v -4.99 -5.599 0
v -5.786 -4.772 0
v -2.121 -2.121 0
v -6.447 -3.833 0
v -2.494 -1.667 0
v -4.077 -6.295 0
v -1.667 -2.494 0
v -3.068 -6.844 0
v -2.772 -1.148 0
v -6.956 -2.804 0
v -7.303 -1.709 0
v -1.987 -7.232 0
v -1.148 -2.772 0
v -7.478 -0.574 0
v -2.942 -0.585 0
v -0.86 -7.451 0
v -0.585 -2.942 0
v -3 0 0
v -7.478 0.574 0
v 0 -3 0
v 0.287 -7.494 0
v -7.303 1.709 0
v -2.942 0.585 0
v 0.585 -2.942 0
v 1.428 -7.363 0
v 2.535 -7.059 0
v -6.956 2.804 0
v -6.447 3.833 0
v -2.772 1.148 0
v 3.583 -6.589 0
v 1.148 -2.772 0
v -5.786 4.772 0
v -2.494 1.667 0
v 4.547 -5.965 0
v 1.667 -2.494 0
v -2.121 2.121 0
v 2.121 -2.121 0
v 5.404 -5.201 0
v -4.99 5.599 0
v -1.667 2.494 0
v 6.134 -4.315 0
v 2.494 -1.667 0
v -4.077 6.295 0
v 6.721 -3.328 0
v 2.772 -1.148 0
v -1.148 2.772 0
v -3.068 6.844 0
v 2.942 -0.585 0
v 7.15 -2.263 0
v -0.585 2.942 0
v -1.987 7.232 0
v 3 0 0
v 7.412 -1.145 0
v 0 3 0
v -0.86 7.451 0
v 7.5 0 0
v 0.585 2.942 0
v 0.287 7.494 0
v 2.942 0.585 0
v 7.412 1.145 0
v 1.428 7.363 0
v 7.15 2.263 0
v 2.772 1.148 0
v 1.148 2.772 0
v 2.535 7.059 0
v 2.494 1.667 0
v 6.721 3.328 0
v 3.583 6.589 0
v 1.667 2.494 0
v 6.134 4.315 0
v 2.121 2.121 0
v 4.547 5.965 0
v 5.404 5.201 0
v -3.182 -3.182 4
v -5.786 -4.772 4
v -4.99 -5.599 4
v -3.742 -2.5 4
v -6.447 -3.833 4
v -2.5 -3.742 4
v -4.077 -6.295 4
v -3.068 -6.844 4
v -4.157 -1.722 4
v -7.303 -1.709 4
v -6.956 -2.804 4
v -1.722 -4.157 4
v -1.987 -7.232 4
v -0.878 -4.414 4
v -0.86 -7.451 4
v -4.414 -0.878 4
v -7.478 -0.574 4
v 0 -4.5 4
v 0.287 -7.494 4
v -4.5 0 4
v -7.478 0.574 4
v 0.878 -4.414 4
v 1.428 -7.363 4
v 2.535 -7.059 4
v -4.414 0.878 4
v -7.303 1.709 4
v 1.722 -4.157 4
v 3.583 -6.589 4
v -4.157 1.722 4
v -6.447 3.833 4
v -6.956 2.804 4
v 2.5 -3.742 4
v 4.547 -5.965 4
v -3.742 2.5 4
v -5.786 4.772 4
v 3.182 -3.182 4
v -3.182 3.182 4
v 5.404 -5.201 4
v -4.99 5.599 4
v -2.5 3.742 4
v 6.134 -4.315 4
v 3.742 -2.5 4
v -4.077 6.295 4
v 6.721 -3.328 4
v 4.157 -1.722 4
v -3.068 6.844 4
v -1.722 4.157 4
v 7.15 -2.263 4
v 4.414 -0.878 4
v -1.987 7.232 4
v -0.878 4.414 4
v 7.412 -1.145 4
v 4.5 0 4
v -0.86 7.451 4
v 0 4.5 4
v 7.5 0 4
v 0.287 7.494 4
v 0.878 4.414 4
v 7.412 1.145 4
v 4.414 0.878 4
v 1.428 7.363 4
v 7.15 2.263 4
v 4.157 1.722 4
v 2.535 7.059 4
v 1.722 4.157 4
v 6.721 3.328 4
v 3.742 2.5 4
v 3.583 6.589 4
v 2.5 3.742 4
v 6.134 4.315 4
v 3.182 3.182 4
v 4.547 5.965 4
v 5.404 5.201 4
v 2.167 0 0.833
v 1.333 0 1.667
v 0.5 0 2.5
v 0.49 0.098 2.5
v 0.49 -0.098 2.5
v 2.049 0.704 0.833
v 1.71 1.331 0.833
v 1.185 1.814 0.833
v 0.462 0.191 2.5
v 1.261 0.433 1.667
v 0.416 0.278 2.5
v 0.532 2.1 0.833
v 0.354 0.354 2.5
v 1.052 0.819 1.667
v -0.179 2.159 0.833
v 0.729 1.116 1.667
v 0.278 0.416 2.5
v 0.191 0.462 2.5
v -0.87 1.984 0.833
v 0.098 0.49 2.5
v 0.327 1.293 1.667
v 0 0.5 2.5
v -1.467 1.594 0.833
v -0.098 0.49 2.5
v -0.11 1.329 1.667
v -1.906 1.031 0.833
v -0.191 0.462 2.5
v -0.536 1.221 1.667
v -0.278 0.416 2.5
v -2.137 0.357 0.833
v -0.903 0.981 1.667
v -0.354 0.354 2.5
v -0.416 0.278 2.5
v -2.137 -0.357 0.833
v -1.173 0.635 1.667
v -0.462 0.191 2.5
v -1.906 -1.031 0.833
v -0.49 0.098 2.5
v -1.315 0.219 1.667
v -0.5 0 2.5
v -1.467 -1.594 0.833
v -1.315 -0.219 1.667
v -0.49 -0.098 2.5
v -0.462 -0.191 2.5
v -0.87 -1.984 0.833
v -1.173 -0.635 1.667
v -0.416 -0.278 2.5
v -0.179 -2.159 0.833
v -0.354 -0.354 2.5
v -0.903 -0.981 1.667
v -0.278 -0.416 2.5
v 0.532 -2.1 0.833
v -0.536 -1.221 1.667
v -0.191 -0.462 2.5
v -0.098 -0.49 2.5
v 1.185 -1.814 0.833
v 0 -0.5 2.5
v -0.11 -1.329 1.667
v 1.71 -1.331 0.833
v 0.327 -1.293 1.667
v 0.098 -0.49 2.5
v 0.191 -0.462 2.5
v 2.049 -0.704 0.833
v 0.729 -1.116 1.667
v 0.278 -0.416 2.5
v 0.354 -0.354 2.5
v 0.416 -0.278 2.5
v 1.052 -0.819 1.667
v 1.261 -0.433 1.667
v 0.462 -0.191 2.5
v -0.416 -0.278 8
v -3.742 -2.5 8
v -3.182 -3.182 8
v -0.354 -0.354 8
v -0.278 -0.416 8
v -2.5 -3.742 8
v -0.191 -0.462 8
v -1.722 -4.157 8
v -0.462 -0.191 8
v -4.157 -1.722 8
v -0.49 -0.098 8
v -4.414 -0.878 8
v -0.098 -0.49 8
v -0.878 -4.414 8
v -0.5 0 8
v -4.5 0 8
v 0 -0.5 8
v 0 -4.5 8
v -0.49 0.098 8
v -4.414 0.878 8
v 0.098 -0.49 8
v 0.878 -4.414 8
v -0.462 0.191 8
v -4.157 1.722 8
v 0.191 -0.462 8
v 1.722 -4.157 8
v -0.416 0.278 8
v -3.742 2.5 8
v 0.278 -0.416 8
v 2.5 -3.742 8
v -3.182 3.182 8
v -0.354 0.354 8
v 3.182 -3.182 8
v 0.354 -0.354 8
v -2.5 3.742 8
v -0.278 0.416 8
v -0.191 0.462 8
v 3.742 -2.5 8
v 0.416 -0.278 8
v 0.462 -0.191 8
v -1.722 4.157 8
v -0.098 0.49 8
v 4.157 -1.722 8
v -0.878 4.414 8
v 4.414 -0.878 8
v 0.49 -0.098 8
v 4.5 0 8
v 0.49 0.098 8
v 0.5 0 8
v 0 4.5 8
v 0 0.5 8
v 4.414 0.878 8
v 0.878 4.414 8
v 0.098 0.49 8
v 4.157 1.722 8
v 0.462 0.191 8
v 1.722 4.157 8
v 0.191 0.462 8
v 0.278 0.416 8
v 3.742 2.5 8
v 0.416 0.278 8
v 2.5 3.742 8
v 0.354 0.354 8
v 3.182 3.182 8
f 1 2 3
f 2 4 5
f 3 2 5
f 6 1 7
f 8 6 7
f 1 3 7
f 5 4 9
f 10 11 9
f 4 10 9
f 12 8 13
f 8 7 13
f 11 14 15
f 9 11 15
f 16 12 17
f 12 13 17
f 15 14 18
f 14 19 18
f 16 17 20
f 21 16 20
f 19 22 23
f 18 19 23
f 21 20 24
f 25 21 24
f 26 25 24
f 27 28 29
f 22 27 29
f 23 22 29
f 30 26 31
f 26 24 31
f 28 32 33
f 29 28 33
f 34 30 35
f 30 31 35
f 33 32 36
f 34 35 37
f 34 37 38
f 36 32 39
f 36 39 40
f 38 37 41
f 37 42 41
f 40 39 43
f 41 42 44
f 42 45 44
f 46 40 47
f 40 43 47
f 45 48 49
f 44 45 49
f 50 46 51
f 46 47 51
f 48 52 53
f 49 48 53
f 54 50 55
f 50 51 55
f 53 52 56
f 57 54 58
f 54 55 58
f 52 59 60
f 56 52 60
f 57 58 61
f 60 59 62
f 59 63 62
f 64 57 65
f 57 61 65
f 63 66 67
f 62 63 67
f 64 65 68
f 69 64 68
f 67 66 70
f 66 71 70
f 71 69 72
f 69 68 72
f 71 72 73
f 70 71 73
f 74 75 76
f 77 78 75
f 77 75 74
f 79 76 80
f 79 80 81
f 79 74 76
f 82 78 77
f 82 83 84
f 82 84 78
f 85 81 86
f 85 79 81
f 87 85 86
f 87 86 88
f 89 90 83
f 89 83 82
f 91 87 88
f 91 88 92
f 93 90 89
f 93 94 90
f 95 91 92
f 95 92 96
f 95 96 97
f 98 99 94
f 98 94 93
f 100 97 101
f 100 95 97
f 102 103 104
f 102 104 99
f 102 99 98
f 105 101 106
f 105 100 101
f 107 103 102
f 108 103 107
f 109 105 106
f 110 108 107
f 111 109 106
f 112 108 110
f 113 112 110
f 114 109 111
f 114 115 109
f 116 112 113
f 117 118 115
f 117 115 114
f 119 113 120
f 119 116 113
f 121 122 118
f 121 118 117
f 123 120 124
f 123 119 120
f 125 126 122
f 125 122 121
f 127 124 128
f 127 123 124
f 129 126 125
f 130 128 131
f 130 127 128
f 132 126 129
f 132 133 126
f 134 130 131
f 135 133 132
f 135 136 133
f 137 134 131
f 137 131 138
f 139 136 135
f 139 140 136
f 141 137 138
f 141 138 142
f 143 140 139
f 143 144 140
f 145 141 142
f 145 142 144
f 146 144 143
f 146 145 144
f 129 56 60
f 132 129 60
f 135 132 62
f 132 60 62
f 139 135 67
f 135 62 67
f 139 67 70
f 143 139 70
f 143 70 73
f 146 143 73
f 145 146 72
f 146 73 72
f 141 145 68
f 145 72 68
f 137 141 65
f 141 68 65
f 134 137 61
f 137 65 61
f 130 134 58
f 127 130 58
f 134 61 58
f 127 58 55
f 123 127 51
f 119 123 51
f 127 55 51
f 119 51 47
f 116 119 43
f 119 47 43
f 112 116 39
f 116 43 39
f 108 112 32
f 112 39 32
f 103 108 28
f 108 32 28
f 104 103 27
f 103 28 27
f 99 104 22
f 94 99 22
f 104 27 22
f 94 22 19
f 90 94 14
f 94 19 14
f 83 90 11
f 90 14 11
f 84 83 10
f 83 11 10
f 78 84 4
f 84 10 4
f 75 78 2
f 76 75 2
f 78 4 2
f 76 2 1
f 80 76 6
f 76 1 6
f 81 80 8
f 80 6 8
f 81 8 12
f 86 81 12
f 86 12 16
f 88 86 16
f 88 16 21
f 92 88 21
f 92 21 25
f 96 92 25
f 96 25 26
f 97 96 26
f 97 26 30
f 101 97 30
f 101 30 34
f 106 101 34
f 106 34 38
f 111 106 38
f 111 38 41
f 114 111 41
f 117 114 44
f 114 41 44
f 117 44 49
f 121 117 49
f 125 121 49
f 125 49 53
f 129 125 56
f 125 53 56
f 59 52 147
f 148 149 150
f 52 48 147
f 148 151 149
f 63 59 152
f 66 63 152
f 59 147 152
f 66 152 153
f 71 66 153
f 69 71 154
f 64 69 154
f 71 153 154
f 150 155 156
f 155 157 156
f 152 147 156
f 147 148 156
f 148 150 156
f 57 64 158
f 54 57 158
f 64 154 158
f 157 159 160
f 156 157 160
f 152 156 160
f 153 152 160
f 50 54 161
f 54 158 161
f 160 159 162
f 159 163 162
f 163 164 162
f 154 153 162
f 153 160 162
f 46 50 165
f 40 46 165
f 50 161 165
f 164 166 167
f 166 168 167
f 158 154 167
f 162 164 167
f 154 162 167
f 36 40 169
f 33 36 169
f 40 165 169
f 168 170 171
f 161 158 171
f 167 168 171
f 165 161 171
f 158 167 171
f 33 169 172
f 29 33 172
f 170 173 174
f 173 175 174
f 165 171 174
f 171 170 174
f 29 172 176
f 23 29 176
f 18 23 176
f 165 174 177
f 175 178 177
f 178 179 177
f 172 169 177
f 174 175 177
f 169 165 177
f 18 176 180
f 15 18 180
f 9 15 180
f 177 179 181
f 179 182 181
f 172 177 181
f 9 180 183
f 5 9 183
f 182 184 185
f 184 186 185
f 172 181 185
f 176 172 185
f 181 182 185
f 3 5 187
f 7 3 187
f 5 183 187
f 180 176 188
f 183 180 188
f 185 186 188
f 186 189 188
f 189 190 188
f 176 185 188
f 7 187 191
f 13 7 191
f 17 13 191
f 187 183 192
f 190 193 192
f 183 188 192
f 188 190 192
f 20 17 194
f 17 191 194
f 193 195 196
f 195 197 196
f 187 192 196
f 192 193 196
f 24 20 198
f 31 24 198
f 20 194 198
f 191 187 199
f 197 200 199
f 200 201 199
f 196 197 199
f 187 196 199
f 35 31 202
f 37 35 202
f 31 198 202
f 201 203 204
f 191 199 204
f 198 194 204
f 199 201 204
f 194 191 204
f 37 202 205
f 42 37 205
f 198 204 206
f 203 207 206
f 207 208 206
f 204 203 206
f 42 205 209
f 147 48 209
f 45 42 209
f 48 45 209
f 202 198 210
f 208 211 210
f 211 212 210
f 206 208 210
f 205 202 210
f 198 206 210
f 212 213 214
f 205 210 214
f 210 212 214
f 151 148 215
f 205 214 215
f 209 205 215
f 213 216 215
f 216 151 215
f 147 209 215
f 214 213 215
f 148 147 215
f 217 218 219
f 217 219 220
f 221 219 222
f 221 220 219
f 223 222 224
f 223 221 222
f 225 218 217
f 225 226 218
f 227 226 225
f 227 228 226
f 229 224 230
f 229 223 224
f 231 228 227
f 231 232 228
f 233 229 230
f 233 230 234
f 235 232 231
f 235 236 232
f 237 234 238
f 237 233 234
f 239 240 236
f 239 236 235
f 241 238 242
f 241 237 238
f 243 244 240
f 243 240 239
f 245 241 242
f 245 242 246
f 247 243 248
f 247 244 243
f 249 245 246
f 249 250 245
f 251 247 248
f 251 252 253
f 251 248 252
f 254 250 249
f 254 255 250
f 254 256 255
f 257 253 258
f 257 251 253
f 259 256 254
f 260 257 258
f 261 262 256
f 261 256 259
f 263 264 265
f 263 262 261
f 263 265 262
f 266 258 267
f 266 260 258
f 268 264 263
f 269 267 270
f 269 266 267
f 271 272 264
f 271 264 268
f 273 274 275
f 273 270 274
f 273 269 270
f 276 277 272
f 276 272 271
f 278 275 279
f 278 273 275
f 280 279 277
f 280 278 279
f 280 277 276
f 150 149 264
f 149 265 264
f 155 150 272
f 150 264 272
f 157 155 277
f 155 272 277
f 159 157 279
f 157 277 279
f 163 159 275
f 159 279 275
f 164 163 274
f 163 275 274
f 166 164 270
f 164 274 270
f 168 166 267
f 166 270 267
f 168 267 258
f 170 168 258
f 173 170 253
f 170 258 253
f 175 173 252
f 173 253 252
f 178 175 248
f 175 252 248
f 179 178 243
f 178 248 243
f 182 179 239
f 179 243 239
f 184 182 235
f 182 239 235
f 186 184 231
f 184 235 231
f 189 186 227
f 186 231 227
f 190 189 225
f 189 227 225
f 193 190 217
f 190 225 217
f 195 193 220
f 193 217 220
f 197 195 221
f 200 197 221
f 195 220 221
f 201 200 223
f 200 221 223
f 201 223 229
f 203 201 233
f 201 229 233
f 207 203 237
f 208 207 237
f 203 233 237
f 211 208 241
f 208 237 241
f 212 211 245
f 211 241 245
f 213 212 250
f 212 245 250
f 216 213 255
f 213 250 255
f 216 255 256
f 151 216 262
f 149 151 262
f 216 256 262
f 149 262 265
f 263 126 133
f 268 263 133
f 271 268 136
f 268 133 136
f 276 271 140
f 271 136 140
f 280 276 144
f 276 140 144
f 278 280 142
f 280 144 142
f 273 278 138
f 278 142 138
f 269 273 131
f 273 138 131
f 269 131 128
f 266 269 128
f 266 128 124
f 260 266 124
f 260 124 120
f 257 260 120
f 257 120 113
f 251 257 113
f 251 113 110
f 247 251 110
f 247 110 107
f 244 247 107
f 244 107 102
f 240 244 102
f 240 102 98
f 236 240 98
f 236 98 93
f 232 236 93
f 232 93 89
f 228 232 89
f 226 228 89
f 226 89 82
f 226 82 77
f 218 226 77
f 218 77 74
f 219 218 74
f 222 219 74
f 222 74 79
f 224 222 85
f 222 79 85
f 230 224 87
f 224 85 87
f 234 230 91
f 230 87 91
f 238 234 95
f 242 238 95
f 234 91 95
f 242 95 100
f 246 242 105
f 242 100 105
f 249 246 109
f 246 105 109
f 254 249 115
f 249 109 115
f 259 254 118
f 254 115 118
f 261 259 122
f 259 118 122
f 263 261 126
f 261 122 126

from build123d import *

# Parameters (mm, degrees)
SKETCH_1_R            = 4.5
EXTRUDE_1_DEPTH       = 8
SKETCH_3_R            = 7.5
EXTRUDE_2_DEPTH       = 4
F_1_0MM_1_D           = 1
F_1_0MM_1_CSINK_D     = 6
F_1_0MM_1_CSINK_ANGLE = 90


with BuildPart() as part:
    # 草图1 → 凸台-拉伸1 (new body)
    with BuildSketch(Plane.XY):
        Circle(SKETCH_1_R)
    extrude(amount=EXTRUDE_1_DEPTH)

    # 草图3 → 凸台-拉伸2 (add)
    with BuildSketch(Plane.XY):
        Circle(SKETCH_3_R)
    extrude(amount=EXTRUDE_2_DEPTH)

    # Ø1.0mm 暗销孔1 (through all)
    with Locations(Plane(origin=(0, 0, 0), x_dir=(-1, 0, 0), z_dir=(0, 0, -1))):
        with Locations((0, 0)):
            CounterSinkHole(F_1_0MM_1_D / 2, F_1_0MM_1_CSINK_D / 2, counter_sink_angle=F_1_0MM_1_CSINK_ANGLE)


solid = part.part
